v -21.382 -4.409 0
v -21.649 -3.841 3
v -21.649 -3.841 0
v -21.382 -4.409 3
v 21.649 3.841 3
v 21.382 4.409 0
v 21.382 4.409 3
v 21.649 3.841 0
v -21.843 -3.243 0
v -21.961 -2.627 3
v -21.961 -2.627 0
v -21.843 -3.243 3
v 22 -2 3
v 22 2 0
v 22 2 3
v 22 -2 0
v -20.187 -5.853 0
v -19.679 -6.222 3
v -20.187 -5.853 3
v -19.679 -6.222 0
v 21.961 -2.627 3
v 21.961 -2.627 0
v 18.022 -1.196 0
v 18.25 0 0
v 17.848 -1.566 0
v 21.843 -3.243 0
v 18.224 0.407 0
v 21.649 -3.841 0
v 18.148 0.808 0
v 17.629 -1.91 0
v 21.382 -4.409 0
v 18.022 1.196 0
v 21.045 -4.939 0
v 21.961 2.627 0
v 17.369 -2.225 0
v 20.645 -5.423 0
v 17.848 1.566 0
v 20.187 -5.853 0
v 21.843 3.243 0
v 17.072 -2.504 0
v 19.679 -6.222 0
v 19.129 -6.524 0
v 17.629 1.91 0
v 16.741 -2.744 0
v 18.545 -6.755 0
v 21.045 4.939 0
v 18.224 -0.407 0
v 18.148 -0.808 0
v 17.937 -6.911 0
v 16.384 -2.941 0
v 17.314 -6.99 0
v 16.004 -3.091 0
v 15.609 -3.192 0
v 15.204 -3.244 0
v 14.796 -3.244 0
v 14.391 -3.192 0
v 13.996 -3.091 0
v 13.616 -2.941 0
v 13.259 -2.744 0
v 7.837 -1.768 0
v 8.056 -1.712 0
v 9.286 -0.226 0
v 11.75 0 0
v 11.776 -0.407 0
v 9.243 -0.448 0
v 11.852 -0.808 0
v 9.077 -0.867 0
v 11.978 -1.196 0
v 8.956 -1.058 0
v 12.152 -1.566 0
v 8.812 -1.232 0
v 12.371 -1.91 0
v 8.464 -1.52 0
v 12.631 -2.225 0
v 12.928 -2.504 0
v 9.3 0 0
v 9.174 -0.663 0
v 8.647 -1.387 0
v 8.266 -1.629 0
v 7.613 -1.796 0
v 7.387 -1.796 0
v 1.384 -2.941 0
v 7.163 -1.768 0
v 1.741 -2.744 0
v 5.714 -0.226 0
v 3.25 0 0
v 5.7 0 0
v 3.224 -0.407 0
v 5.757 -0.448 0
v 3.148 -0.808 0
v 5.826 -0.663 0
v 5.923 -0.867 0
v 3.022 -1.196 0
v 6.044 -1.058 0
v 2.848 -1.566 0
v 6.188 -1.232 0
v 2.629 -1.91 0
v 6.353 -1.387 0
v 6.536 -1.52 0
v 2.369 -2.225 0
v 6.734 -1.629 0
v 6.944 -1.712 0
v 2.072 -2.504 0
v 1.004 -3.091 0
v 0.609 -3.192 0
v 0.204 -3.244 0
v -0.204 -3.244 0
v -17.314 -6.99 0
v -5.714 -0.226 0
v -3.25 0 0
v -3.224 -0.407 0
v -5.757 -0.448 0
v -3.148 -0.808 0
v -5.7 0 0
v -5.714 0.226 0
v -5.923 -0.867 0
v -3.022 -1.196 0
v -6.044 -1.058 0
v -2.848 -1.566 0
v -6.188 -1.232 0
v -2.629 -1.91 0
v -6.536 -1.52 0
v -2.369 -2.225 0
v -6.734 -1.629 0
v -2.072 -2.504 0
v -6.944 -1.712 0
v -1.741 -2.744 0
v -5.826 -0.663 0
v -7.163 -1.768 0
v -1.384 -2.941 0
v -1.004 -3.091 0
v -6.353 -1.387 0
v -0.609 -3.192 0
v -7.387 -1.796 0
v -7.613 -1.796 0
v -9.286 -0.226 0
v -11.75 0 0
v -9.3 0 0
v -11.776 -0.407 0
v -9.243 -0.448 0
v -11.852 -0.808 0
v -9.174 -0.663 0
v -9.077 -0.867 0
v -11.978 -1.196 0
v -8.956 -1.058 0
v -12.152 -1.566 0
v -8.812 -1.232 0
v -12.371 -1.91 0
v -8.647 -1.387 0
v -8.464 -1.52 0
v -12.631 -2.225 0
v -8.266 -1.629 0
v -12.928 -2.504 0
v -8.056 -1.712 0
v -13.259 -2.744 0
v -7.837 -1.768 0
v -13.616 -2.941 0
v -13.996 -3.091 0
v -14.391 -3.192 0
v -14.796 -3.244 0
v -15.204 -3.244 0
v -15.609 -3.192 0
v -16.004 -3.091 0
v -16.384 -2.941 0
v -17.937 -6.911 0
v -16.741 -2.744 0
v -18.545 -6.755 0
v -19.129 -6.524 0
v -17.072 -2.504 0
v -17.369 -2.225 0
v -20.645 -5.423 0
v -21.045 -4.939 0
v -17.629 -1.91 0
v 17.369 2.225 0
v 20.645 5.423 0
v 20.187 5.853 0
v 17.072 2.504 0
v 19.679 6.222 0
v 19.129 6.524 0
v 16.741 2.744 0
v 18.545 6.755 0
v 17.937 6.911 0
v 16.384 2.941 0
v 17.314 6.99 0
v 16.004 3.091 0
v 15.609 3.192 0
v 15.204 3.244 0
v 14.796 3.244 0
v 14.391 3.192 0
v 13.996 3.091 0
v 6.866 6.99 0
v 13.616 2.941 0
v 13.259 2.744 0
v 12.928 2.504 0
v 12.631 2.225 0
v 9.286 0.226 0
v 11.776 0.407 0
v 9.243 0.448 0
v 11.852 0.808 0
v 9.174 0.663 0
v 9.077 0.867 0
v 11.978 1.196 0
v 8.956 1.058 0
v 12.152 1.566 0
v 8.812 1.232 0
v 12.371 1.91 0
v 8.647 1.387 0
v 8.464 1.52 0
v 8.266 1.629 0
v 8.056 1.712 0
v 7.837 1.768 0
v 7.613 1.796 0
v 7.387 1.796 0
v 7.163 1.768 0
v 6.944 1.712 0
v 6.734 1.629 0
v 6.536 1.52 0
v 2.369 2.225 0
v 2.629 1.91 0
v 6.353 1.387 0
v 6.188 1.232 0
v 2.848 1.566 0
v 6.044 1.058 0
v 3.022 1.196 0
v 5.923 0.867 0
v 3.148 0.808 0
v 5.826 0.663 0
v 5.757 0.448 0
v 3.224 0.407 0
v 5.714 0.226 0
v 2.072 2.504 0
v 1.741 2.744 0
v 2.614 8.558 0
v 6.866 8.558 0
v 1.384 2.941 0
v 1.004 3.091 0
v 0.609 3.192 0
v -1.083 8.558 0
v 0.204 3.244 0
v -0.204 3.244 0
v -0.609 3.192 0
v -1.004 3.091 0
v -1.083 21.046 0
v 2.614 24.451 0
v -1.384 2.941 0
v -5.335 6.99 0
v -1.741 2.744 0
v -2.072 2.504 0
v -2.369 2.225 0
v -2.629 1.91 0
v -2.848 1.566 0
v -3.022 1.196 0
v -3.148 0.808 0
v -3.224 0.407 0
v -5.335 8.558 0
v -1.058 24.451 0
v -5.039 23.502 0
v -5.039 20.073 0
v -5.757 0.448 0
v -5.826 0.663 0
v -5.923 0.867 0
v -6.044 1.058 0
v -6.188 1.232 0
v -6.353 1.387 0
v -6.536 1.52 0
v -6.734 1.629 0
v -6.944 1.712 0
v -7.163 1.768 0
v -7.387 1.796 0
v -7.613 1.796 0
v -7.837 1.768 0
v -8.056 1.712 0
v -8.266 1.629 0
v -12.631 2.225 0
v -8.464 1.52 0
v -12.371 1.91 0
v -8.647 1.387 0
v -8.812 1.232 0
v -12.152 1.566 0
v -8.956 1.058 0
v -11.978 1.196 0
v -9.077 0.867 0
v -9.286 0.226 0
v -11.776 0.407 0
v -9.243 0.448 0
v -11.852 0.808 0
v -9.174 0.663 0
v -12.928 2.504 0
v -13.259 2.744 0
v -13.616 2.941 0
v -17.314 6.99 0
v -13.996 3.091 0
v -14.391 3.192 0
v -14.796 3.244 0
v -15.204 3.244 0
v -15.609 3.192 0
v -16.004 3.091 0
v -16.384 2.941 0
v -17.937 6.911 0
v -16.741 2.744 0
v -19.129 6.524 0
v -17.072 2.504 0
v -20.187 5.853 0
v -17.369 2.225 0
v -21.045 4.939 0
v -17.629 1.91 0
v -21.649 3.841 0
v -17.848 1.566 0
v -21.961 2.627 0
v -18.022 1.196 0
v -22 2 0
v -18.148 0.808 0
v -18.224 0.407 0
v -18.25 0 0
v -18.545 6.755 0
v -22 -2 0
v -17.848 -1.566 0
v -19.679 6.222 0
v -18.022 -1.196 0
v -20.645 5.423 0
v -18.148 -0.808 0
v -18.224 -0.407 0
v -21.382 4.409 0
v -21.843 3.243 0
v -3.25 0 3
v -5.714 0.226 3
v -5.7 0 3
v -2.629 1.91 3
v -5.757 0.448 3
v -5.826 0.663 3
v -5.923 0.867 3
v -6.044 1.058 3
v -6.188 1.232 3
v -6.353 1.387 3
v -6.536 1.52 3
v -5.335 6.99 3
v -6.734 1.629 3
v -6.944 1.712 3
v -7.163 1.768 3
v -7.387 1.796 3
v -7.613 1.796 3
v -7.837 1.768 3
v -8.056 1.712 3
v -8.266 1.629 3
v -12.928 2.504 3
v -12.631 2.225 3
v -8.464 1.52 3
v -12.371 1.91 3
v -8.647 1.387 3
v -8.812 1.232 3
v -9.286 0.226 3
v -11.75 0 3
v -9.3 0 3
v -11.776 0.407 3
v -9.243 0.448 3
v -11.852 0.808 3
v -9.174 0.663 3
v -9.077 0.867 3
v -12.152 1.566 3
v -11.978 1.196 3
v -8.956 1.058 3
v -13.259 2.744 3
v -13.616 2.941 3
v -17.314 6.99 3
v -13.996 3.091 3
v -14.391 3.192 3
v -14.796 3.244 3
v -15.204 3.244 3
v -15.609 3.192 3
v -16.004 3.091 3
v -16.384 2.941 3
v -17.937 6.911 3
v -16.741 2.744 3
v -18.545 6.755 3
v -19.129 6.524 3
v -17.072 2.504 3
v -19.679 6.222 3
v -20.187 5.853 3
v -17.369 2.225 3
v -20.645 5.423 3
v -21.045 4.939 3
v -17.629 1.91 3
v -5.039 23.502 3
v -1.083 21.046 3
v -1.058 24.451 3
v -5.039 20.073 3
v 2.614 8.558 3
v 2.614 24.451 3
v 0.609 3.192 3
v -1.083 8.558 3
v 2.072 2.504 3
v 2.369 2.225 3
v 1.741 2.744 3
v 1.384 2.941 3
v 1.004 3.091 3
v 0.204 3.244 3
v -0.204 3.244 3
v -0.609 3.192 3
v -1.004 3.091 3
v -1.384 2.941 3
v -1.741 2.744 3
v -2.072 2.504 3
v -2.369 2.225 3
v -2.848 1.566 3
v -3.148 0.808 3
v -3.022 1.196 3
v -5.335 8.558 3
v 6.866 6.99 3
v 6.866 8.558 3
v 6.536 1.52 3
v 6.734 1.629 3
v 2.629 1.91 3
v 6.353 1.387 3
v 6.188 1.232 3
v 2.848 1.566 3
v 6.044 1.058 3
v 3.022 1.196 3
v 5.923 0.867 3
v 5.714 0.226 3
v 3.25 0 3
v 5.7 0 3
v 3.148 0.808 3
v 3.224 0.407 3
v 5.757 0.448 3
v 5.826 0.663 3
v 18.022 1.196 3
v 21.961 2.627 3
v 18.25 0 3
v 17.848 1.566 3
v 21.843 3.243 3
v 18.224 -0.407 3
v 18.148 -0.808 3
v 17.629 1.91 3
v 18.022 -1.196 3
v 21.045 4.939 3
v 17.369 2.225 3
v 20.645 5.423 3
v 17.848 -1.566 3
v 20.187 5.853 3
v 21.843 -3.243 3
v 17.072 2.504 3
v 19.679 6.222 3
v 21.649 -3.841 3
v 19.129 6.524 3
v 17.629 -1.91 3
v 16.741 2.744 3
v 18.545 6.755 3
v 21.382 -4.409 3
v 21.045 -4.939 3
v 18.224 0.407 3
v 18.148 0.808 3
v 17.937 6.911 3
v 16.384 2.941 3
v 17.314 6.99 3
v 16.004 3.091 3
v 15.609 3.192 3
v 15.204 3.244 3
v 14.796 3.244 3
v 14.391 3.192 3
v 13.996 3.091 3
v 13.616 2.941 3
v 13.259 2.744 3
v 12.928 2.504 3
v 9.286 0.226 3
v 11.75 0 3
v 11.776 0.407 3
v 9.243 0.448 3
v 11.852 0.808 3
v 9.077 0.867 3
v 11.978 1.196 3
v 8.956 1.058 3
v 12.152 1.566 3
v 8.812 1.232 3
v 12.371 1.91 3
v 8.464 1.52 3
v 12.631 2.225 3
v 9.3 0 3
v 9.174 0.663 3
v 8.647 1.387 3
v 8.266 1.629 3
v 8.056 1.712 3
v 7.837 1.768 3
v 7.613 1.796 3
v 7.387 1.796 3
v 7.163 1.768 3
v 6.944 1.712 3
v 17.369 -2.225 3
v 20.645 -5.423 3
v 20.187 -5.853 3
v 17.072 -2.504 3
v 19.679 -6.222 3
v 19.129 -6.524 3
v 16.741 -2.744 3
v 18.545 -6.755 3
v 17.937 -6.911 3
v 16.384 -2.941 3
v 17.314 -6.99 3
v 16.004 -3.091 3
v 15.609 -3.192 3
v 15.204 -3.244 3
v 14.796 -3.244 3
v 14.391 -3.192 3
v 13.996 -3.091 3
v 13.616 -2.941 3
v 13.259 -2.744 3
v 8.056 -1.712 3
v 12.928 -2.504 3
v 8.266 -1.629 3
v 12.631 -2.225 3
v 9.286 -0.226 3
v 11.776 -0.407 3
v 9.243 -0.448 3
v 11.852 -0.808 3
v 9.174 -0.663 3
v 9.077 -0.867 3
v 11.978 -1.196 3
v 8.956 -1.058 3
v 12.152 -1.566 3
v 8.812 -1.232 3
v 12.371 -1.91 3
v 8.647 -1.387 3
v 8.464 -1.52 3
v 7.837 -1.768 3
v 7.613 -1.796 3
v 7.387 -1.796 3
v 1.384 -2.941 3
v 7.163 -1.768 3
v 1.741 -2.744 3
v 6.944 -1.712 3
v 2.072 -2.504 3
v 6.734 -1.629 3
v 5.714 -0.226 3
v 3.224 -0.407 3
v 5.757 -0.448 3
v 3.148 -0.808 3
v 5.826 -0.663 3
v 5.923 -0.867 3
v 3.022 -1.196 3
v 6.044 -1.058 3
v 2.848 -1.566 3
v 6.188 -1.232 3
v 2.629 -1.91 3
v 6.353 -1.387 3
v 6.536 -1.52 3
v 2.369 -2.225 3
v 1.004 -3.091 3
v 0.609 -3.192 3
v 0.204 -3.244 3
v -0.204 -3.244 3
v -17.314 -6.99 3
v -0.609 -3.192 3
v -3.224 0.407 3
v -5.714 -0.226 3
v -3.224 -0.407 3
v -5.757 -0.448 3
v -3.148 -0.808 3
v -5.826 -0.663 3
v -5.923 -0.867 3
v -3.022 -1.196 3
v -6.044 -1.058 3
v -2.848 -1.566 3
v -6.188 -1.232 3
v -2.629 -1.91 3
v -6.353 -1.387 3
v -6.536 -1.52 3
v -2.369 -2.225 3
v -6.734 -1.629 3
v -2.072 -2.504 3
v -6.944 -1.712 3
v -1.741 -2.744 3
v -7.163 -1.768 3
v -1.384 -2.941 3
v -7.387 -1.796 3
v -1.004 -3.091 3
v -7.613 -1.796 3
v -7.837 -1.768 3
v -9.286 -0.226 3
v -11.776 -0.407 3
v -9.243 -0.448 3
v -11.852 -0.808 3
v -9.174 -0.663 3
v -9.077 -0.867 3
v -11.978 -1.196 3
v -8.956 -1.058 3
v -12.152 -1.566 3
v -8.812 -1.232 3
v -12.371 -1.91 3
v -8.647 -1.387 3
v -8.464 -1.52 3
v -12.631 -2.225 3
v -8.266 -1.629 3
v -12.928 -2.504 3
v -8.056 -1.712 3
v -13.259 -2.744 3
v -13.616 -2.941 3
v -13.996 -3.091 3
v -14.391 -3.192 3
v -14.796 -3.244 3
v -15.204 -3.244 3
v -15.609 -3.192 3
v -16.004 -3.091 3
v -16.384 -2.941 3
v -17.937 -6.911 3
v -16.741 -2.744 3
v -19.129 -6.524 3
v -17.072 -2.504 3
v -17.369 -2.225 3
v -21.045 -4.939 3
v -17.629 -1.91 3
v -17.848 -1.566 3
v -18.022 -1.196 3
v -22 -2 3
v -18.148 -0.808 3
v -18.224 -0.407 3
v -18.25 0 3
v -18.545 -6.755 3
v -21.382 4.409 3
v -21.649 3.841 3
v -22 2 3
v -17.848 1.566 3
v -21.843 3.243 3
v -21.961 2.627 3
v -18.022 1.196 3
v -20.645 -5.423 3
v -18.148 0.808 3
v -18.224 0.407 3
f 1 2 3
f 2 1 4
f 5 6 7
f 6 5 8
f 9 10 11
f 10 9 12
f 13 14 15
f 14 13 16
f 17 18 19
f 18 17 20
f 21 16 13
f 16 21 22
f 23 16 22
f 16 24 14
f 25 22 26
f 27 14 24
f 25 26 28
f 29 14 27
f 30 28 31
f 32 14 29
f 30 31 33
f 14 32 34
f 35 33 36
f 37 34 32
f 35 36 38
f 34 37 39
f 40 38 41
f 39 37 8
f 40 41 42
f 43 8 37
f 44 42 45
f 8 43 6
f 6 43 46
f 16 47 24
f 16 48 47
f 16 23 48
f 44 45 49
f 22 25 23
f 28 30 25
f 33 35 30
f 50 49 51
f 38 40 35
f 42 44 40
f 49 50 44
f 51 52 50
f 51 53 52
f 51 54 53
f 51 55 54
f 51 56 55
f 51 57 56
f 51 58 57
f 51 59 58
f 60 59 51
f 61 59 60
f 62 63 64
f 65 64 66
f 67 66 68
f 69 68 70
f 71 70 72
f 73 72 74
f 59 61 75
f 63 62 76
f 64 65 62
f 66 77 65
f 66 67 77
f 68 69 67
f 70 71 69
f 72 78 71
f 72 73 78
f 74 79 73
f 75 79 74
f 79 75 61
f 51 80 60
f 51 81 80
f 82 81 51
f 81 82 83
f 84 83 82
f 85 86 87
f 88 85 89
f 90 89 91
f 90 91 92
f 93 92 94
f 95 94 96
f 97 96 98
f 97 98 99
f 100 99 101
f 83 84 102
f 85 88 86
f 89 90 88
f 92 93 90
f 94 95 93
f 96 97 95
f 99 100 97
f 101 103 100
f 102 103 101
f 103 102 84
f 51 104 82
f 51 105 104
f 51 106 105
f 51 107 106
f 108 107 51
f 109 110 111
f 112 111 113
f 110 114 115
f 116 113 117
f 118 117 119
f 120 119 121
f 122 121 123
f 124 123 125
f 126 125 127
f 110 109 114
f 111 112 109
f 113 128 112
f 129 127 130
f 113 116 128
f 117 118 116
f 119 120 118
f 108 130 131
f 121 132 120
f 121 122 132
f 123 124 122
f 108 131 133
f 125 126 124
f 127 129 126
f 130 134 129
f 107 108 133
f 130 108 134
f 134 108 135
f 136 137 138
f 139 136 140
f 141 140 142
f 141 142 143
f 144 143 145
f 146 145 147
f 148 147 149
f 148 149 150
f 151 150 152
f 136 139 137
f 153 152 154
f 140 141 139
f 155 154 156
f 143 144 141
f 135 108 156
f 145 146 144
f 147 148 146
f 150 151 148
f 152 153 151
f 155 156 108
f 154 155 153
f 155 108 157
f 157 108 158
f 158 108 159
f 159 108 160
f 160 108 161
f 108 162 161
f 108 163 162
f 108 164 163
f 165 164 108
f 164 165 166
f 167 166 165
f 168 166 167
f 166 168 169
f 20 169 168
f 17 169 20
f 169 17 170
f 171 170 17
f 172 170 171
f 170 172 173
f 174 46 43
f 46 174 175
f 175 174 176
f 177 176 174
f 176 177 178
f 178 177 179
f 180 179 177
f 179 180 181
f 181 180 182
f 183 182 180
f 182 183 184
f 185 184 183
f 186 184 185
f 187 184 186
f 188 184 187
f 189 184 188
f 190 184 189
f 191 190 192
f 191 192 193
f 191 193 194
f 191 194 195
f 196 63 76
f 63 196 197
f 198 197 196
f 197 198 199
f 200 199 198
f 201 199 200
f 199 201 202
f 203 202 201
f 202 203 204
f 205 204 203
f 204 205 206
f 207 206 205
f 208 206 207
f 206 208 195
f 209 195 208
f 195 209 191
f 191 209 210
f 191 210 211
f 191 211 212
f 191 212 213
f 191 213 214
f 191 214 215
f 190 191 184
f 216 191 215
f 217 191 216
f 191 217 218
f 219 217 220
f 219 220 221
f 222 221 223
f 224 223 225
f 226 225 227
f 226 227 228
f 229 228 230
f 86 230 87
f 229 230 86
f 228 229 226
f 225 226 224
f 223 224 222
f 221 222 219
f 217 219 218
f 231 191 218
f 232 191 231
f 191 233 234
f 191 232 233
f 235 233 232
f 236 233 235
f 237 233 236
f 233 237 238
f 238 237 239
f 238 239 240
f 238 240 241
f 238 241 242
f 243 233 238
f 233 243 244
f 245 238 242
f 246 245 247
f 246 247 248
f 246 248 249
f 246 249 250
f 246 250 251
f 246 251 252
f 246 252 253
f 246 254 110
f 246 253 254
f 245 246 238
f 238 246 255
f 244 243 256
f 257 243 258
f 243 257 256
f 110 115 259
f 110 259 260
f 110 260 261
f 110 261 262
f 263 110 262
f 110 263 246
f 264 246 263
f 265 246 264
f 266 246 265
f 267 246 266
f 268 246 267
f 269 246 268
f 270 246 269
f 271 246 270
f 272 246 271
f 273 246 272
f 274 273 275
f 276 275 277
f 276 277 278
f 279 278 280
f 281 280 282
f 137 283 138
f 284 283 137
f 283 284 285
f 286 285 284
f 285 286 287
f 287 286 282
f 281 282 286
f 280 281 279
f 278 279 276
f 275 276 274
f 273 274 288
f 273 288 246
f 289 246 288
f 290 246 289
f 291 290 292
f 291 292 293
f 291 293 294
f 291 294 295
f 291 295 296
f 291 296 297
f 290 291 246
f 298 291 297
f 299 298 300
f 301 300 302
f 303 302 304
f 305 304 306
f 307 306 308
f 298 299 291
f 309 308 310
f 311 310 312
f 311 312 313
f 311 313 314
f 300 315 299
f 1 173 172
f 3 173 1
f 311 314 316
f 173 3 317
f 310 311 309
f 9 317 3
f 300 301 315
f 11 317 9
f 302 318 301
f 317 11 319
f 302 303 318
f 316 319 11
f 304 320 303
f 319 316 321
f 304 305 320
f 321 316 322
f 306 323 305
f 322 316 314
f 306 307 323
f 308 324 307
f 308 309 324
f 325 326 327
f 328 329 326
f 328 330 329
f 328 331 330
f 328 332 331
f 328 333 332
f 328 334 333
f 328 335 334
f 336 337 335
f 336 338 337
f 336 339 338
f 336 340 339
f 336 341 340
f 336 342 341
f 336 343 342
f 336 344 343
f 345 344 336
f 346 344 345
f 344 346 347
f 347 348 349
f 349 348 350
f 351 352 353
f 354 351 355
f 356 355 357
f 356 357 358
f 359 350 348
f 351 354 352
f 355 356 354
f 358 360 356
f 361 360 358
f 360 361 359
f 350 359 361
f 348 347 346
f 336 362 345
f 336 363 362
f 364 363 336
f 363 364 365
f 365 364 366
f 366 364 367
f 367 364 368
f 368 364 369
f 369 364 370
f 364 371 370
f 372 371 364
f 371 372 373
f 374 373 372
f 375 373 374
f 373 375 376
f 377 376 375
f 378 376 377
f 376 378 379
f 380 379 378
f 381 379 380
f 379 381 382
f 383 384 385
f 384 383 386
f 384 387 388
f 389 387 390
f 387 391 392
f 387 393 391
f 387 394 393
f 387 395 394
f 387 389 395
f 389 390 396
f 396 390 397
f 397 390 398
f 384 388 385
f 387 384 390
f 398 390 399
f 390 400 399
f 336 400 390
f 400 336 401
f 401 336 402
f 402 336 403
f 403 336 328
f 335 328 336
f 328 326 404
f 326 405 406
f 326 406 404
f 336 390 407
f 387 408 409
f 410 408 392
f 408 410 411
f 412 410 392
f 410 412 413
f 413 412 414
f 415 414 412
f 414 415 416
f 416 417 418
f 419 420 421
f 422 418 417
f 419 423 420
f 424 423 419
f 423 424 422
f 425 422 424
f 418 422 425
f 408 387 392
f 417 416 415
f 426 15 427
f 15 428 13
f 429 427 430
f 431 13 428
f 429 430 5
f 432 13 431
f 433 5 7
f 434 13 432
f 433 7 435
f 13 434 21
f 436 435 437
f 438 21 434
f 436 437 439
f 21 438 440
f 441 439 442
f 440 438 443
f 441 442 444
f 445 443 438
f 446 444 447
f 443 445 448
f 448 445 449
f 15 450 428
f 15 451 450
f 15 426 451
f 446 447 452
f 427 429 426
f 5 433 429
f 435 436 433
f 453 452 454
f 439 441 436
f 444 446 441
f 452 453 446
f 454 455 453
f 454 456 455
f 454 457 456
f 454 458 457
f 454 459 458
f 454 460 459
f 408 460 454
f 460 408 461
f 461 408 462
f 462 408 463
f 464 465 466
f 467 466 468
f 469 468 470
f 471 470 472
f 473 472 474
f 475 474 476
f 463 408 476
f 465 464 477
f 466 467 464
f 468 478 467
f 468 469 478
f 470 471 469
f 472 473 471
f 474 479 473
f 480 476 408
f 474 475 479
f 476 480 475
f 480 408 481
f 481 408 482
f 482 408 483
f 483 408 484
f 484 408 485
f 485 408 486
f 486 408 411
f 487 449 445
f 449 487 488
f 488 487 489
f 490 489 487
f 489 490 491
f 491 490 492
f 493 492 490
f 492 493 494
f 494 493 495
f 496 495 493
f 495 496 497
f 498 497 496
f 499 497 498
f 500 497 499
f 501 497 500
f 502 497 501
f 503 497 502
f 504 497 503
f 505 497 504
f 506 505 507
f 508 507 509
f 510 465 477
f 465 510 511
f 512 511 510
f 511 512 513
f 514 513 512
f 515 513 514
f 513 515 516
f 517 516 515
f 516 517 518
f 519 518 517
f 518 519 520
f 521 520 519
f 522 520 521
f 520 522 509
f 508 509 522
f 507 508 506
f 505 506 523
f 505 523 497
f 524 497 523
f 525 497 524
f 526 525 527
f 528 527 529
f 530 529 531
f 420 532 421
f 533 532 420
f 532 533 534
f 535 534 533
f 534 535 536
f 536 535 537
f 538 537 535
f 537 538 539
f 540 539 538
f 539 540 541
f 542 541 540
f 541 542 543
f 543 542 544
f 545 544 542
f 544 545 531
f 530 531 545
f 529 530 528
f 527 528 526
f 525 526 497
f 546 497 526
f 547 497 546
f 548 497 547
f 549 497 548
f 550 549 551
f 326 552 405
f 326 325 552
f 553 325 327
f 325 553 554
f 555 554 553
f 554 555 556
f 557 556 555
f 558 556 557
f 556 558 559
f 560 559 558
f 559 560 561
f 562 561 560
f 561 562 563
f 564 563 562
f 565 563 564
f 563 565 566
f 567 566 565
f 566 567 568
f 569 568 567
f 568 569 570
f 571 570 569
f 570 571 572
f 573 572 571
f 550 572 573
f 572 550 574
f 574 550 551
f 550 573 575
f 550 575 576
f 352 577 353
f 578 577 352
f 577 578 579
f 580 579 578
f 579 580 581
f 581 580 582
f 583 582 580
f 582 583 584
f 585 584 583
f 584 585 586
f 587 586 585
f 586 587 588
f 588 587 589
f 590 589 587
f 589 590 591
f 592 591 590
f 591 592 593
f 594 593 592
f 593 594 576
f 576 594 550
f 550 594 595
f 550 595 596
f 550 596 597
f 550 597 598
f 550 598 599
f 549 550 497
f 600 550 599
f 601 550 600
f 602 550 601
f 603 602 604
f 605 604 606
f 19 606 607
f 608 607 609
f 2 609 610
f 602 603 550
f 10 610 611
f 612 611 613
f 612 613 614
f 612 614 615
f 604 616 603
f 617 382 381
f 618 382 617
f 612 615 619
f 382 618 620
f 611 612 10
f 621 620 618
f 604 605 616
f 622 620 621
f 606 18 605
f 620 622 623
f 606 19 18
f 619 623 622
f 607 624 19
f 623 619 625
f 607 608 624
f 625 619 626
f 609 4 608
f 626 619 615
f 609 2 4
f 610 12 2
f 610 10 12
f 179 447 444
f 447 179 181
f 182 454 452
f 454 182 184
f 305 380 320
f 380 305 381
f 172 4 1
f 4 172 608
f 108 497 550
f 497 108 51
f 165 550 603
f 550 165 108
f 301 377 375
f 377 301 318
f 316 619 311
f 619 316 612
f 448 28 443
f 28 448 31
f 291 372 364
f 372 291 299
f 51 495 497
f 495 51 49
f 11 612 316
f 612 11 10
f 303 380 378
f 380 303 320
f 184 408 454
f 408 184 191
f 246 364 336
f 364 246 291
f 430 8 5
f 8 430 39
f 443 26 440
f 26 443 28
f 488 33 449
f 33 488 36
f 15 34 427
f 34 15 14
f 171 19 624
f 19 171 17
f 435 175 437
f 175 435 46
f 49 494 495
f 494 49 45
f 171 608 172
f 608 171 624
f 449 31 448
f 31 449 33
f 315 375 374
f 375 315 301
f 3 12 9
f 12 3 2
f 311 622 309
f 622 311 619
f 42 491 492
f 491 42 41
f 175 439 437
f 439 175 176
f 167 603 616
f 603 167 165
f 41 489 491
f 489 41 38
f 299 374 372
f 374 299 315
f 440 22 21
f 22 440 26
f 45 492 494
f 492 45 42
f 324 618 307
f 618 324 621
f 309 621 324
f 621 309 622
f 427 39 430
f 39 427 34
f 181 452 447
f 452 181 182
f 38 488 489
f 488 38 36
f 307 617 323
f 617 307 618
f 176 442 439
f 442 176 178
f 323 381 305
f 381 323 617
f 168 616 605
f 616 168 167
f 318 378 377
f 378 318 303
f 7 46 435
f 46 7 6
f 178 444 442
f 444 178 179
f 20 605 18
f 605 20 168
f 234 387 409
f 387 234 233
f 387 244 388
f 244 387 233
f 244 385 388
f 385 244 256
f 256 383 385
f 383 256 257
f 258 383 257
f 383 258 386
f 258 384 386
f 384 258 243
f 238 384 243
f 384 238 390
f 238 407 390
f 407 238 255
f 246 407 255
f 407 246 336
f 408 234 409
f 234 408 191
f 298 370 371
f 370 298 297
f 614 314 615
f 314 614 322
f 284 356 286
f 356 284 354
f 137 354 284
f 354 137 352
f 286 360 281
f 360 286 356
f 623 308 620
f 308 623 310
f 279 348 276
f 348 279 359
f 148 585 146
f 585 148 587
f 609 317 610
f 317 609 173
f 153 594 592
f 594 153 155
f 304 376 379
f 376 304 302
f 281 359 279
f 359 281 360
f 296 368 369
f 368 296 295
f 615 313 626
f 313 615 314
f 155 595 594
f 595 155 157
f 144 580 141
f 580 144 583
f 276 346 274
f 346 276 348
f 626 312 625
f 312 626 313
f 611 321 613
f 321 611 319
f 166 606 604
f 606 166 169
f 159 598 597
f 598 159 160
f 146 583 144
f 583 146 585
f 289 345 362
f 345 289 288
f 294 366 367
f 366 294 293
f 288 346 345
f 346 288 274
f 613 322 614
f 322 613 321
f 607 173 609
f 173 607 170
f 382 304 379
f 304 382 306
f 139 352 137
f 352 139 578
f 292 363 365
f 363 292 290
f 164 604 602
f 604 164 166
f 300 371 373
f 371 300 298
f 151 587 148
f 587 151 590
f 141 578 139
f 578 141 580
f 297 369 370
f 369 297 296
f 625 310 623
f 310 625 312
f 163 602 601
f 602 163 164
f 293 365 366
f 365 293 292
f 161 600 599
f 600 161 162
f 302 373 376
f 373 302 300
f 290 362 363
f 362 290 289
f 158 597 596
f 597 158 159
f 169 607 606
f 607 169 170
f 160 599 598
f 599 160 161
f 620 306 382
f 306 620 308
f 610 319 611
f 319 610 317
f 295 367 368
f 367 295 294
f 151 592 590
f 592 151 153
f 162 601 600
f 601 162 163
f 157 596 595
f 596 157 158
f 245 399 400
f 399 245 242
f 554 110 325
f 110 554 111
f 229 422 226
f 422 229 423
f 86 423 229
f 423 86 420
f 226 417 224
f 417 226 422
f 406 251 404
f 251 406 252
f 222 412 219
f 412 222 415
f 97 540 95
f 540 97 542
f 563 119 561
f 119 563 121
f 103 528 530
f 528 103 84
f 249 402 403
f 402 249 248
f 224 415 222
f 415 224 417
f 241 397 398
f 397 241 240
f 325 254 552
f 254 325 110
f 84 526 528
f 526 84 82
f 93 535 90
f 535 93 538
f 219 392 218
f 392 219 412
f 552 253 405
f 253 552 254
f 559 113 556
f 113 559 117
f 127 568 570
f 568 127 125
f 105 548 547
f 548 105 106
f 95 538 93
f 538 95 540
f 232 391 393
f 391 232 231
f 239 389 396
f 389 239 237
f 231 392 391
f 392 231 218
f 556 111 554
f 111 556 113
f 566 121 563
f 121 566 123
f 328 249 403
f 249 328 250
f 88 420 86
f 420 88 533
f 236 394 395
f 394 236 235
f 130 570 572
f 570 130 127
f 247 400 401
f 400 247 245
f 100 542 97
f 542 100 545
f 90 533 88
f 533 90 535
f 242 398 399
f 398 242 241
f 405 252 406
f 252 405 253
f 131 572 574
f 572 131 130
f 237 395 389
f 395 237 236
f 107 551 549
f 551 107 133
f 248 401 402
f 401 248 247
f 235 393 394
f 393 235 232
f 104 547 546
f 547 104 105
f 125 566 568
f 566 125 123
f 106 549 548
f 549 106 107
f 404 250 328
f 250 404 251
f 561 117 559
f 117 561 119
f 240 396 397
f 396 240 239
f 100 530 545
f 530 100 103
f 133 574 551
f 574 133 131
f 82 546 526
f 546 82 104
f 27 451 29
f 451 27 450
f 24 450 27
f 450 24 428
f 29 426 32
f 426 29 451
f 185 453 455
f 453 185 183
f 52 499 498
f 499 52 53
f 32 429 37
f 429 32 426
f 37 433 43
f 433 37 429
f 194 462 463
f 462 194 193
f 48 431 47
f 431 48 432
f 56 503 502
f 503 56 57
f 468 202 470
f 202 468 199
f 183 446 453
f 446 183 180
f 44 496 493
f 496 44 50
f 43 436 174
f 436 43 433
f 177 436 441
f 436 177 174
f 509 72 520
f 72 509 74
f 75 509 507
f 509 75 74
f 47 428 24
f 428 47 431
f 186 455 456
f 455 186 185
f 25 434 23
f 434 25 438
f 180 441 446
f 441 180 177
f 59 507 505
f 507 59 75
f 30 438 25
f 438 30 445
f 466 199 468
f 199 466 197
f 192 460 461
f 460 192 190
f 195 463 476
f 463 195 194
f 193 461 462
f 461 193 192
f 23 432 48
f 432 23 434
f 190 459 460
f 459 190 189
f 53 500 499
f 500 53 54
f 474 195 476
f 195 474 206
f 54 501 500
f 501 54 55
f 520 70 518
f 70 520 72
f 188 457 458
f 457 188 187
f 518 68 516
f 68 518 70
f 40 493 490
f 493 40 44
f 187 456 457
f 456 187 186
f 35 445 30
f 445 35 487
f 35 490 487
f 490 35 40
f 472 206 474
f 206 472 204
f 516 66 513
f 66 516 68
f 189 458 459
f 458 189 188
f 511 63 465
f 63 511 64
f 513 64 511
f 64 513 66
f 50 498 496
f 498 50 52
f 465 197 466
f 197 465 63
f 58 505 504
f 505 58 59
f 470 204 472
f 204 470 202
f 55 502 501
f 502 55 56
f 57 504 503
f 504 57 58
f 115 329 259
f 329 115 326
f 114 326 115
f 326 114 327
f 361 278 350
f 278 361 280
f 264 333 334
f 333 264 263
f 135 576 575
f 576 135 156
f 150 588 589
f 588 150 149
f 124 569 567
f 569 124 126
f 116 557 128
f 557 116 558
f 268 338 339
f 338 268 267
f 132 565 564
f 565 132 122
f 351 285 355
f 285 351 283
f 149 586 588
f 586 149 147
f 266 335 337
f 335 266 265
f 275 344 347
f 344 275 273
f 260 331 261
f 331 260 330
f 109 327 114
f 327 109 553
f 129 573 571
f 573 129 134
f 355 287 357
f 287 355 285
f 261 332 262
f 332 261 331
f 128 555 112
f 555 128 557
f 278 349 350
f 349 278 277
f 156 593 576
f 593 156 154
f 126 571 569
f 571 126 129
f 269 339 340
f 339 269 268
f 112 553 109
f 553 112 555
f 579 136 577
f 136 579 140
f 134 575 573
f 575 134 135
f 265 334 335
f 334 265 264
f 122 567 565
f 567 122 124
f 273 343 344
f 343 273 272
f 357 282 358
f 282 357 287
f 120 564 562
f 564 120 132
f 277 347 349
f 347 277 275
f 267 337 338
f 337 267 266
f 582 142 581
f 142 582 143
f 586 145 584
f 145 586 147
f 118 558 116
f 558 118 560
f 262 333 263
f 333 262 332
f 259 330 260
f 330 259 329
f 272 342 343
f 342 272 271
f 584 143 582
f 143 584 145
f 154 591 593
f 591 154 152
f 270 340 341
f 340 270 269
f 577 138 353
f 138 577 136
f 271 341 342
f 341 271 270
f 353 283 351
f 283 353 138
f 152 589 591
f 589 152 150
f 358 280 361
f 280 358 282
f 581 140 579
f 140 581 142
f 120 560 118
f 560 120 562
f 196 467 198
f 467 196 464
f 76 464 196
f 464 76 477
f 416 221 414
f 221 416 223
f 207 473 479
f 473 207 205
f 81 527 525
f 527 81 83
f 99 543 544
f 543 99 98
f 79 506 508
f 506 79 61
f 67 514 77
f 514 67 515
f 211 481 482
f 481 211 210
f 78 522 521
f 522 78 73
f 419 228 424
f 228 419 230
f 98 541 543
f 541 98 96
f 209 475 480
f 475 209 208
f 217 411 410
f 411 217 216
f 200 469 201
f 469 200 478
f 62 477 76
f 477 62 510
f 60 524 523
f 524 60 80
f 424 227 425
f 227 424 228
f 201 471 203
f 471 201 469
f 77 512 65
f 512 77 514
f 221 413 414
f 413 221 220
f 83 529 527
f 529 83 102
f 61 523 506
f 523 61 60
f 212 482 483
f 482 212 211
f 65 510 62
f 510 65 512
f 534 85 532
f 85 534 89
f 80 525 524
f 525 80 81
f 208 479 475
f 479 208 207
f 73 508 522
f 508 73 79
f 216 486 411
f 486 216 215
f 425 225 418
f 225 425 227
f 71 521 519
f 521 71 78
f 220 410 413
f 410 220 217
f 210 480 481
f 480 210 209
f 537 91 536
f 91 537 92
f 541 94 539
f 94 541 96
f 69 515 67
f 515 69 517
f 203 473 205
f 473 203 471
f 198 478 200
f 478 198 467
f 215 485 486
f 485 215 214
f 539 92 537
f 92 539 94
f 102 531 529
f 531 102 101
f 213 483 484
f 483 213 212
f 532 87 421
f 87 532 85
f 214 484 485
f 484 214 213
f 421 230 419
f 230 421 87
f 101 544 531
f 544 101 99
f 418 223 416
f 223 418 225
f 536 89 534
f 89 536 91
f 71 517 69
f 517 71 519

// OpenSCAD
$fn = 50;


difference() {
	union() {
		hull() {
			translate(v = [-17.0000000000, 2.0000000000, 0]) {
				cylinder(h = 3, r = 5);
			}
			translate(v = [17.0000000000, 2.0000000000, 0]) {
				cylinder(h = 3, r = 5);
			}
			translate(v = [-17.0000000000, -2.0000000000, 0]) {
				cylinder(h = 3, r = 5);
			}
			translate(v = [17.0000000000, -2.0000000000, 0]) {
				cylinder(h = 3, r = 5);
			}
		}
		translate(v = [0, 24, 0]) {
			linear_extrude(height = 3) {
				text(font = "DejaVu Sans Mono:style=Bold", halign = "center", size = 19.0000000000, text = "1", valign = "top");
			}
		}
	}
	union() {
		translate(v = [-15.0000000000, 0.0000000000, 0]) {
			translate(v = [0, 0, -100]) {
				cylinder(h = 200, r = 3.2500000000);
			}
		}
		translate(v = [0, 0, -100]) {
			cylinder(h = 200, r = 3.2500000000);
		}
		translate(v = [15.0000000000, 0.0000000000, 0]) {
			translate(v = [0, 0, -100]) {
				cylinder(h = 200, r = 3.2500000000);
			}
		}
		translate(v = [-15.0000000000, 0.0000000000, 0]) {
			translate(v = [0, 0, -100]) {
				cylinder(h = 200, r = 1.8000000000);
			}
		}
		translate(v = [-7.5000000000, 0.0000000000, 0]) {
			translate(v = [0, 0, -100]) {
				cylinder(h = 200, r = 1.8000000000);
			}
		}
		translate(v = [0, 0, -100]) {
			cylinder(h = 200, r = 1.8000000000);
		}
		translate(v = [7.5000000000, 0.0000000000, 0]) {
			translate(v = [0, 0, -100]) {
				cylinder(h = 200, r = 1.8000000000);
			}
		}
		translate(v = [15.0000000000, 0.0000000000, 0]) {
			translate(v = [0, 0, -100]) {
				cylinder(h = 200, r = 1.8000000000);
			}
		}
	}
}
